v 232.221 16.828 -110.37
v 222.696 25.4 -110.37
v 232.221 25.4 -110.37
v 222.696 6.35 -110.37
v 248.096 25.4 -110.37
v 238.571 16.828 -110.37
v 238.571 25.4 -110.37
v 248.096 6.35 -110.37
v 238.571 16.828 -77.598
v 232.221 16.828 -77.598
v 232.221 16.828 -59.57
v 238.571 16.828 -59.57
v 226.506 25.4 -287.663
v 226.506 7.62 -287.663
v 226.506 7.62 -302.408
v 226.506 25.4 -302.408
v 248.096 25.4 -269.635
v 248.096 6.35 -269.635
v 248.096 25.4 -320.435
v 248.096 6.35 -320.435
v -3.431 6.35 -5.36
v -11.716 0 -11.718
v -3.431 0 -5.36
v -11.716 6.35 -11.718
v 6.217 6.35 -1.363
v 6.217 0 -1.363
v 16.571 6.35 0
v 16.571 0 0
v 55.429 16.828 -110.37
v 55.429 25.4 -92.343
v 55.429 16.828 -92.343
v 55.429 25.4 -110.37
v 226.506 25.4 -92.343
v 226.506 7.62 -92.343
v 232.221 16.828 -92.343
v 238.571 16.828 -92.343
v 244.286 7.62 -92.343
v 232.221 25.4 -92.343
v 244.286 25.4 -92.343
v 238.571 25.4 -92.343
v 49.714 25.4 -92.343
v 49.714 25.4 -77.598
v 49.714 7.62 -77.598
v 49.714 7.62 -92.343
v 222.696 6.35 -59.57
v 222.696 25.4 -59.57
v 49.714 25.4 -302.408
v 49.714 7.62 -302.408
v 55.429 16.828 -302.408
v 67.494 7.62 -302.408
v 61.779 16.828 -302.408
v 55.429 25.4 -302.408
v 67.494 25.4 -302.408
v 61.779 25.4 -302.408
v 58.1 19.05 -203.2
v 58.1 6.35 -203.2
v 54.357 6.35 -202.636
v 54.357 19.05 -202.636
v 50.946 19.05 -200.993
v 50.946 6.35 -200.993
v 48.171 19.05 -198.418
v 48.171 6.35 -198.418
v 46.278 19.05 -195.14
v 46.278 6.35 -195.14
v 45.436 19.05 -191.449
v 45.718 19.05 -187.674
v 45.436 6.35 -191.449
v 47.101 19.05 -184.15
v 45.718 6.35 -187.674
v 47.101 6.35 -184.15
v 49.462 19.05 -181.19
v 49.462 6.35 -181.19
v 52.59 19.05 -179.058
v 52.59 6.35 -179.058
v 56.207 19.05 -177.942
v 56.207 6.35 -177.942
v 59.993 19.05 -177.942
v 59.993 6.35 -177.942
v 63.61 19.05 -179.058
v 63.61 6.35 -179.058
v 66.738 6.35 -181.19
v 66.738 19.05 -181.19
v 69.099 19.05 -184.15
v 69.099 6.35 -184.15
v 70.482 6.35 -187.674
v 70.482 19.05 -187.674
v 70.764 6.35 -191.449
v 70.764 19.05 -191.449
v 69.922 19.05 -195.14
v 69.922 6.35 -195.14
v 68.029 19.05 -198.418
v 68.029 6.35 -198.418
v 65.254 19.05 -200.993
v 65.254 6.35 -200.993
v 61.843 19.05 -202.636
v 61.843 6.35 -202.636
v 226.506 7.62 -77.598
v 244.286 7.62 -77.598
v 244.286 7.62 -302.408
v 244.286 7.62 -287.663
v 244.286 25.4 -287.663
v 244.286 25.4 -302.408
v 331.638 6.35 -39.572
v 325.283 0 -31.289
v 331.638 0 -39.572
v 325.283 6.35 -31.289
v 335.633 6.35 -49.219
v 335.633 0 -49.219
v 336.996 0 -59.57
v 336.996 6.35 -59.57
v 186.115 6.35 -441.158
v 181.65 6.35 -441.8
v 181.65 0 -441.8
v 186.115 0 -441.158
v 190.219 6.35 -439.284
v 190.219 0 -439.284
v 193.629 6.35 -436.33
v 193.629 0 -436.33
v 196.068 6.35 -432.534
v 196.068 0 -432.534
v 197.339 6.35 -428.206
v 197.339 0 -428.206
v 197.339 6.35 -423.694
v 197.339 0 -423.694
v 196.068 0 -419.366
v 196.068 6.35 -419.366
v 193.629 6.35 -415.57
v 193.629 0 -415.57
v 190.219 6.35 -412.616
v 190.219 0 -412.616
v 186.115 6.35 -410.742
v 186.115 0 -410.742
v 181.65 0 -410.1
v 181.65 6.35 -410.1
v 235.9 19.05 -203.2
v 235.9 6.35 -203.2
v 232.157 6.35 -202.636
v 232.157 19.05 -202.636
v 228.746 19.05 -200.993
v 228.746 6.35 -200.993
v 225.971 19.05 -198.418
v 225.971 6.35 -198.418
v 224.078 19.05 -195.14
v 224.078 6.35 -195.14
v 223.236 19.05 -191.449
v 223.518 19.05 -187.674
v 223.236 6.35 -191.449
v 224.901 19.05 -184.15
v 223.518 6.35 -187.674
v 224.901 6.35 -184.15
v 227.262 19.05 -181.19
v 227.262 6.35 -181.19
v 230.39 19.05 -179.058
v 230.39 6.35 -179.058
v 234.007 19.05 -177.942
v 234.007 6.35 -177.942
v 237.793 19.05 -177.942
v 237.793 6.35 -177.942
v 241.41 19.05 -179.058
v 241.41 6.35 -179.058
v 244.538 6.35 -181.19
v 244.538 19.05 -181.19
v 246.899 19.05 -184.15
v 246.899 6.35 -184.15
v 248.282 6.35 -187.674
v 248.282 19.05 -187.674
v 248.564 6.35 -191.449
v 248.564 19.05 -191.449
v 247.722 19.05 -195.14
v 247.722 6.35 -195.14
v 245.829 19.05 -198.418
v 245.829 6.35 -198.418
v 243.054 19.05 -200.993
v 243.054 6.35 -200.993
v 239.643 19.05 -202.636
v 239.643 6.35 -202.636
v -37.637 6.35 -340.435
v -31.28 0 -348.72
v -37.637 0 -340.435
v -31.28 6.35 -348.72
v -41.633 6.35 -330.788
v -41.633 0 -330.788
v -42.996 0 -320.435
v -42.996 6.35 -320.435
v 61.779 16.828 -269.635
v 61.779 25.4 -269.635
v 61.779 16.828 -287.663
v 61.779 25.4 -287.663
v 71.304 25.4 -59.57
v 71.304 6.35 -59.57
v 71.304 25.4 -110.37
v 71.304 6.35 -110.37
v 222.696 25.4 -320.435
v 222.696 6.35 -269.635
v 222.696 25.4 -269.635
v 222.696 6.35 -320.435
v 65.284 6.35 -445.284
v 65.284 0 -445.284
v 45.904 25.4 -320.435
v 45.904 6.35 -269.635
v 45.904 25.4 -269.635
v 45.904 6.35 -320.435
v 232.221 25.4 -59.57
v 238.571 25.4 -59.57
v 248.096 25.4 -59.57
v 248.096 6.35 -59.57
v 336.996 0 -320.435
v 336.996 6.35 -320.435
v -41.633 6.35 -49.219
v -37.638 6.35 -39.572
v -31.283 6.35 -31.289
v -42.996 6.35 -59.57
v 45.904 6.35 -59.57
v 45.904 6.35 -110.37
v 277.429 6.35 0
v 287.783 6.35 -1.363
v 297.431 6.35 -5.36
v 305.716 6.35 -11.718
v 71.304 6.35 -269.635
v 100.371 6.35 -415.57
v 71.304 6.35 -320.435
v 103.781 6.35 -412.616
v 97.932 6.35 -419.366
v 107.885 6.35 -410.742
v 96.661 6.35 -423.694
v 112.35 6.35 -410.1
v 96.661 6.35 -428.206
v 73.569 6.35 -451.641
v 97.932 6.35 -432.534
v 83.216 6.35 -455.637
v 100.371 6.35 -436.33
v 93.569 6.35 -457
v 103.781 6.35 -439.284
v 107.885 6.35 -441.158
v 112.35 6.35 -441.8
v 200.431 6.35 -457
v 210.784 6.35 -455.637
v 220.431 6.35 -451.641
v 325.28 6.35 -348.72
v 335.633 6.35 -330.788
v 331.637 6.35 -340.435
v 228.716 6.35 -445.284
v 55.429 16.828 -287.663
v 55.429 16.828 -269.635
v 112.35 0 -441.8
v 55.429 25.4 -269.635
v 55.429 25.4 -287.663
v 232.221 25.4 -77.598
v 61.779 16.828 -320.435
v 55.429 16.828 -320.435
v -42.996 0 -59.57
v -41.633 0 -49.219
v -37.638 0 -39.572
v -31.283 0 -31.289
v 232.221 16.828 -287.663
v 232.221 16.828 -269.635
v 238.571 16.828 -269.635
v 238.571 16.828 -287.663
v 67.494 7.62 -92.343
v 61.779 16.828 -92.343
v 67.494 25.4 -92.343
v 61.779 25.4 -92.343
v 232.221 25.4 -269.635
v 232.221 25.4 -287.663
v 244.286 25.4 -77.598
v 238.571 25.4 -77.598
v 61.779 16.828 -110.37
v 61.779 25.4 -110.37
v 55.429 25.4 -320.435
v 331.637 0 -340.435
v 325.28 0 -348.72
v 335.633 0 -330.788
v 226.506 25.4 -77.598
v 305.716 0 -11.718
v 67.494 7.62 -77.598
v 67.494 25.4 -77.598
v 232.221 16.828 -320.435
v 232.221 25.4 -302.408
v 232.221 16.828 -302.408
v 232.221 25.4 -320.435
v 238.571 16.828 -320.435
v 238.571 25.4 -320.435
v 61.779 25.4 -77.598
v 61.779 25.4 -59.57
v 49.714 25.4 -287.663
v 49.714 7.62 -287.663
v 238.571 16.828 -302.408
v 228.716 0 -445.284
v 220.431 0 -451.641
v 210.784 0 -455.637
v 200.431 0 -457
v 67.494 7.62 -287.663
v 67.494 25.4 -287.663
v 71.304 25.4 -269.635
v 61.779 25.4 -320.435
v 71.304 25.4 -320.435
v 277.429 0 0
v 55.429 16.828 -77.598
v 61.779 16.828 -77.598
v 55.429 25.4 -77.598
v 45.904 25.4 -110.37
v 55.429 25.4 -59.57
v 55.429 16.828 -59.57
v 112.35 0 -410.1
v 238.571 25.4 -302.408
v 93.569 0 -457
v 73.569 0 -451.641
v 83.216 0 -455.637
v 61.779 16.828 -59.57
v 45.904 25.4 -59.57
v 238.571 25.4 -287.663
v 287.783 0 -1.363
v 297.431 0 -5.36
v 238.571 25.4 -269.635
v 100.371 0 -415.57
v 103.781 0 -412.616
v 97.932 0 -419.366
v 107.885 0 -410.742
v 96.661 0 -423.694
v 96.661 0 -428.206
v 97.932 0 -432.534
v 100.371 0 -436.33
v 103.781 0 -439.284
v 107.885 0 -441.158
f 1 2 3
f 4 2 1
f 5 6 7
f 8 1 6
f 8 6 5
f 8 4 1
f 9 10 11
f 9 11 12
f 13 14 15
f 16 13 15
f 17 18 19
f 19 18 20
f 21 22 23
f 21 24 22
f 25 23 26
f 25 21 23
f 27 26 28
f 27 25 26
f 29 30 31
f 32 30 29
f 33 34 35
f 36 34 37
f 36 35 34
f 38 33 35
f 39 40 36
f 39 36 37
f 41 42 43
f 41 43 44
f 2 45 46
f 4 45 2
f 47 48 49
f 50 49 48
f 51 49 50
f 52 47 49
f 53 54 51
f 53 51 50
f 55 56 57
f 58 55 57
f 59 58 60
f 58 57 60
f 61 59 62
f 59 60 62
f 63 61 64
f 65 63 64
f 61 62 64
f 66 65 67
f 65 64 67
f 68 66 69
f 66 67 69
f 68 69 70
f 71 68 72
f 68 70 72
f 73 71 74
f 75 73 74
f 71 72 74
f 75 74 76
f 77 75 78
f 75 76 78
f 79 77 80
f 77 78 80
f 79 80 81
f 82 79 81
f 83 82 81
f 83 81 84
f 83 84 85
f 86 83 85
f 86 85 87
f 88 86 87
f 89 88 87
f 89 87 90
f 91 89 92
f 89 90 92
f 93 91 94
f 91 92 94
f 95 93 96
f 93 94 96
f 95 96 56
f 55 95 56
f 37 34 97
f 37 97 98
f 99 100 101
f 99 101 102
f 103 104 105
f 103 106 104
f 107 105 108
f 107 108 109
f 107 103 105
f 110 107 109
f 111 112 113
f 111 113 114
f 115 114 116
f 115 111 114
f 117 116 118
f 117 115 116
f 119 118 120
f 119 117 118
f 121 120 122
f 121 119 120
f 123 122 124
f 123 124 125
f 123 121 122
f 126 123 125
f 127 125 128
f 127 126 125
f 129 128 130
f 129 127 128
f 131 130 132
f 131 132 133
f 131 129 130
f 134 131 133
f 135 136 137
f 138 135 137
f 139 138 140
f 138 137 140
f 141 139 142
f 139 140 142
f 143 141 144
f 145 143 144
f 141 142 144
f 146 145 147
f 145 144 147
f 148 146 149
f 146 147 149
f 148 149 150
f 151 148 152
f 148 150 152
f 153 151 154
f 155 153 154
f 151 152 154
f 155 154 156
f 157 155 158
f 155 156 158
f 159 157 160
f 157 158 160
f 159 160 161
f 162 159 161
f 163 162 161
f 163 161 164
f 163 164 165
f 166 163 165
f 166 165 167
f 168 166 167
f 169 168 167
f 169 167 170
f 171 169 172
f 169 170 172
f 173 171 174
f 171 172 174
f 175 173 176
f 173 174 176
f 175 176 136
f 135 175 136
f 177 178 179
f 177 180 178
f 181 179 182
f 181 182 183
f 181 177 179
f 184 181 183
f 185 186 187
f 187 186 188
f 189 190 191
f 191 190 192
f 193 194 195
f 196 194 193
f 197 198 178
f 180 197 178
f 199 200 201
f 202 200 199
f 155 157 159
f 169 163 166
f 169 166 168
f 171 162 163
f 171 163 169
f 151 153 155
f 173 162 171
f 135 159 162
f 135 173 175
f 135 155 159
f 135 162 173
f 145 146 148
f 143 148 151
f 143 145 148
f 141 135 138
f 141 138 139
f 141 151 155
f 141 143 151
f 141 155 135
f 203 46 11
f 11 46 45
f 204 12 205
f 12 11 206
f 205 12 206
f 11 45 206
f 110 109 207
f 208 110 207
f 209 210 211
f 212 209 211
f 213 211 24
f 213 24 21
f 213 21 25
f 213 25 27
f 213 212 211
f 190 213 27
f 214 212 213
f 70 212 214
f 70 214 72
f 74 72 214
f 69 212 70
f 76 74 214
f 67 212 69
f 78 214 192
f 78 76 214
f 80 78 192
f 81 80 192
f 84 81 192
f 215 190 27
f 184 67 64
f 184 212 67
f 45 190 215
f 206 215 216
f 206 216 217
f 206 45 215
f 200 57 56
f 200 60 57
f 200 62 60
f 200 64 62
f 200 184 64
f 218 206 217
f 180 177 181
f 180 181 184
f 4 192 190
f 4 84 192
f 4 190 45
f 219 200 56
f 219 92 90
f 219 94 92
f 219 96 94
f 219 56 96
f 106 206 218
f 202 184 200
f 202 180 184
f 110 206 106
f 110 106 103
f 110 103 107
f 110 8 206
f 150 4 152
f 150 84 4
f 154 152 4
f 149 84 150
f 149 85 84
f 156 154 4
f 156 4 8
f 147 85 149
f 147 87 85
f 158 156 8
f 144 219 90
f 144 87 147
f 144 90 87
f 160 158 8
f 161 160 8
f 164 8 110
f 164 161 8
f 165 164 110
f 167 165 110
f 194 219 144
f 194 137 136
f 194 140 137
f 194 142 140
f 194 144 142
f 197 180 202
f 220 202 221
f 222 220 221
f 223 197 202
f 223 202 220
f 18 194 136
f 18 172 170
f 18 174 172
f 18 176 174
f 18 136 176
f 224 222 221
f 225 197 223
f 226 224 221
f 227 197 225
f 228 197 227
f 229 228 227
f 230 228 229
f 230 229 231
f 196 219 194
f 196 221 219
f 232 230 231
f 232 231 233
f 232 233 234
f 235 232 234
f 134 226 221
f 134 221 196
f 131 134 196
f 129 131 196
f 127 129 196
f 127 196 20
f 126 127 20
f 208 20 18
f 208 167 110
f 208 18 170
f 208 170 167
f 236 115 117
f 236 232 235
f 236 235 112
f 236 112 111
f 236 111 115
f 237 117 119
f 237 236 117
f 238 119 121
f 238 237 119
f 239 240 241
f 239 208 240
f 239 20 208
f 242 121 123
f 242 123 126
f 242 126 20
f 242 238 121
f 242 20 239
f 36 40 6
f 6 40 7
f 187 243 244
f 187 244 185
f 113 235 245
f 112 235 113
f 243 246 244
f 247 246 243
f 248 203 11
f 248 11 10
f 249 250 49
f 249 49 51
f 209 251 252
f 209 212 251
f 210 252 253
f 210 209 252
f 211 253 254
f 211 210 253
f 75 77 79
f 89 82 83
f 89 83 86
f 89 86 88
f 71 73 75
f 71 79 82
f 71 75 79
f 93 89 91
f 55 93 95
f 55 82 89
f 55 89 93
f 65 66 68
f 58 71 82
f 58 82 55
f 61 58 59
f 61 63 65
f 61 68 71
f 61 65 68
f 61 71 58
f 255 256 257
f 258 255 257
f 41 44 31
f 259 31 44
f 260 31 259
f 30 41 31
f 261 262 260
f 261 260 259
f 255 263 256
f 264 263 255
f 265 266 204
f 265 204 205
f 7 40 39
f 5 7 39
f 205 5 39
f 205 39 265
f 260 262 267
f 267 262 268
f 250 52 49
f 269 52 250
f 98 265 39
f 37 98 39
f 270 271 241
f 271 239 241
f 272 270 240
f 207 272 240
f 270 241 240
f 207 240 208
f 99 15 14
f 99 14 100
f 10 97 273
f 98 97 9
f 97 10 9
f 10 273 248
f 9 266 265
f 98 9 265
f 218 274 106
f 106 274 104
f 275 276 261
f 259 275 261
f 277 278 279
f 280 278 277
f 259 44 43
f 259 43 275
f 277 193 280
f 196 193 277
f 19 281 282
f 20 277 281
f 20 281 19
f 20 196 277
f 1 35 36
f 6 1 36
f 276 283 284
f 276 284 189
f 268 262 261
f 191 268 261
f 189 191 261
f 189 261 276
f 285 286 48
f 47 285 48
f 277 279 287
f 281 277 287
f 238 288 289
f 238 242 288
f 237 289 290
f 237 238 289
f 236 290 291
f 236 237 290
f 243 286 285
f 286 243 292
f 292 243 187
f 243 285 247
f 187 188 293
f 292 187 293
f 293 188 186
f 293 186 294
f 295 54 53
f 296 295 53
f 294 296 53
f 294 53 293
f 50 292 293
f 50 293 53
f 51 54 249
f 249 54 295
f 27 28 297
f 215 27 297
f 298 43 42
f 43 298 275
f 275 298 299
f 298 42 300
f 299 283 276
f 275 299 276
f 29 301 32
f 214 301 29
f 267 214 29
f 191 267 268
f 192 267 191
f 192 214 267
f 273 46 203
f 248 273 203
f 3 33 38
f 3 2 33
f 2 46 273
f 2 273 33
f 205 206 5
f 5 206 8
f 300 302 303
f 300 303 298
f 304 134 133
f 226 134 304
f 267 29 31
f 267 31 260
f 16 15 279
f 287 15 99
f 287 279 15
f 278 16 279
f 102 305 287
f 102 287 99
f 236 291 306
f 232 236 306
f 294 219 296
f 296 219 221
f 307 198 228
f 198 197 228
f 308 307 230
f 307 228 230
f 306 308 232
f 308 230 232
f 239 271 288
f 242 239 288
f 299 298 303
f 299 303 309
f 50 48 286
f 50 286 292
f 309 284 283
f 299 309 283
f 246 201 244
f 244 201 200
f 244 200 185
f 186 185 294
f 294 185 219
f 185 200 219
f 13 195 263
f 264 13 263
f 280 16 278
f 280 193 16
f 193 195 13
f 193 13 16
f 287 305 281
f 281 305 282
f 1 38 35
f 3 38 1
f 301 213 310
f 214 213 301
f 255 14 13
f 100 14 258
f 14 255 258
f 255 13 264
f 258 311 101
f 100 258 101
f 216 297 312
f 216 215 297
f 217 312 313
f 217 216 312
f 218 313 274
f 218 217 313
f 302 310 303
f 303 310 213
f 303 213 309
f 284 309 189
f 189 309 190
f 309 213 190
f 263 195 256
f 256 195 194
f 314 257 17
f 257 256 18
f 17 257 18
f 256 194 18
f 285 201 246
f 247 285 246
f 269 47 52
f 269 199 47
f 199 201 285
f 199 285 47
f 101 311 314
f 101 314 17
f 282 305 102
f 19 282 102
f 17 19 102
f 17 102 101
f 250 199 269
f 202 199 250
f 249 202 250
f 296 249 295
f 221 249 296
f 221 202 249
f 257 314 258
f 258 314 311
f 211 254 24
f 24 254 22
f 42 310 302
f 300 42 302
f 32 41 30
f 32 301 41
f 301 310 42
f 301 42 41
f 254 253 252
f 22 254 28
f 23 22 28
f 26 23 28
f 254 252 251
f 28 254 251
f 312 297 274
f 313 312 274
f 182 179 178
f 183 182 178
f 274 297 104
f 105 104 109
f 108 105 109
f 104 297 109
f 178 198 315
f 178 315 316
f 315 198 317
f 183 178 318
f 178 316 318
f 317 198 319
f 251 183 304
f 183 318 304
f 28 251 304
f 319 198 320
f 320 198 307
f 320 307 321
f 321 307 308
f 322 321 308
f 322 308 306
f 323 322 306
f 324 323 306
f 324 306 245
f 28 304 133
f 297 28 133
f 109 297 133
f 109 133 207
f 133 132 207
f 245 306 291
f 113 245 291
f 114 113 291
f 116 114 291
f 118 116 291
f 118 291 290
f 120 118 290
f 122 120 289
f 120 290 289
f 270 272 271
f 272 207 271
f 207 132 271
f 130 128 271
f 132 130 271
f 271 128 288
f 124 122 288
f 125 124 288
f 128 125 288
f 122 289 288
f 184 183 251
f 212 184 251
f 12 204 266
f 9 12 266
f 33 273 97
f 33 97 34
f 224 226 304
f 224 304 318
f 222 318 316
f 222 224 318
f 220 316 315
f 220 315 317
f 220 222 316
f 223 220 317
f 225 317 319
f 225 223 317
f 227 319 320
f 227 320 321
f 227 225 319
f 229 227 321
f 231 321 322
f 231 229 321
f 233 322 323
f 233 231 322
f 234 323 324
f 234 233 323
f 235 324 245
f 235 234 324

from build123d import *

# Parameters (mm, degrees)
BODY_DEPTH          = 6.35
HANDLE_DEPTH        = 6.35
FILLET1_R           = 40
FILLET2_R           = 40
SKETCH3_W           = 25.4
SKETCH3_H           = 50.8
BOSS_EXTRUDE2_DEPTH = 19.05
SKETCH4_W           = 17.78
SKETCH4_H           = 14.7447
CUT_EXTRUDE1_DEPTH  = 17.78
SKETCH5_W           = 6.35
SKETCH5_H           = 18.02765
CUT_EXTRUDE2_DEPTH  = 8.5725
SKETCH6_R           = 12.7
BOSS_EXTRUDE3_DEPTH = 12.7


with BuildPart() as part:
    # Sketch1 → Body (new body)
    with BuildSketch(Plane(origin=(0, 0, 0), x_dir=(1, 0, 0), z_dir=(0, 1, 0))):
        Polygon((0, 0), (294, 0), (336.996020767, 43.003978862), (336.996020767, 337.003978862), (217, 456.999999629), (77, 456.999999629), (-42.996020767, 337.003978862), (-42.996020767, 43.003978862), align=None)
    extrude(amount=BODY_DEPTH)

    # Sketch2 → Handle (cut)
    with BuildSketch(Plane(origin=(0, 6.35, 0), x_dir=(1, 0, 0), z_dir=(0, 1, 0))):
        with BuildLine():
            Line((112.35, 441.799999629), (181.65, 441.799999629))
            ThreePointArc((181.65, 441.799999629), (197.5, 425.949999629), (181.65, 410.099999629))
            Line((181.65, 410.099999629), (112.35, 410.099999629))
            ThreePointArc((112.35, 410.099999629), (96.5, 425.949999629), (112.35, 441.799999629))
        make_face()
    extrude(amount=-HANDLE_DEPTH, mode=Mode.SUBTRACT)

    # Fillet1
    fillet1_edges = [part.edges().sort_by_distance(p)[0] for p in [
        (77, 3.175, -456.999999629),
        (217, 3.175, -456.999999629),
    ]]
    fillet(fillet1_edges, radius=FILLET1_R)

    # Fillet2
    fillet2_edges = [part.edges().sort_by_distance(p)[0] for p in [
        (-42.996020767, 3.175, -43.003978862),
        (-42.996020767, 3.175, -337.003978862),
        (336.996020767, 3.175, -337.003978862),
        (336.996020767, 3.175, -43.003978862),
        (294, 3.175, 0),
        (0, 3.175, 0),
    ]]
    fillet(fillet2_edges, radius=FILLET2_R)

    # Sketch3 → Boss-Extrude2 (add)
    with BuildSketch(Plane(origin=(0, 6.35, 0), x_dir=(1, 0, 0), z_dir=(0, 1, 0))):
        with Locations((235.396020767, 295.035436367)):
            Rectangle(SKETCH3_W, SKETCH3_H)
        with Locations((58.603979233, 295.035436367)):
            Rectangle(SKETCH3_W, SKETCH3_H)
        with Locations((235.396020767, 84.970353145)):
            Rectangle(SKETCH3_W, SKETCH3_H)
        with Locations((58.603979233, 84.970353145)):
            Rectangle(SKETCH3_W, SKETCH3_H)
    extrude(amount=BOSS_EXTRUDE2_DEPTH)

    # Sketch4 → Cut-Extrude1 (cut)
    with BuildSketch(Plane(origin=(0, 25.4, 0), x_dir=(1, 0, 0), z_dir=(0, 1, 0))):
        with Locations((58.603979233, 295.035436367)):
            Rectangle(SKETCH4_W, SKETCH4_H)
        with Locations((235.396020767, 295.035436367)):
            Rectangle(SKETCH4_W, SKETCH4_H)
        with Locations((58.603979233, 84.970353145)):
            Rectangle(SKETCH4_W, SKETCH4_H)
        with Locations((235.396020767, 84.970353145)):
            Rectangle(SKETCH4_W, SKETCH4_H)
    extrude(amount=-CUT_EXTRUDE1_DEPTH, mode=Mode.SUBTRACT)

    # Sketch5 → Cut-Extrude2 (cut)
    with BuildSketch(Plane(origin=(0, 25.4, 0), x_dir=(1, 0, 0), z_dir=(0, 1, 0))):
        with Locations((58.603979233, 101.356528145)):
            Rectangle(SKETCH5_W, SKETCH5_H)
        with Locations((58.603979233, 311.421611367)):
            Rectangle(SKETCH5_W, SKETCH5_H)
        with Locations((58.603979233, 278.649261367)):
            Rectangle(SKETCH5_W, SKETCH5_H)
        with Locations((235.396020767, 278.649261367)):
            Rectangle(SKETCH5_W, SKETCH5_H)
        with Locations((235.396020767, 311.421611367)):
            Rectangle(SKETCH5_W, SKETCH5_H)
        with Locations((58.603979233, 68.584178145)):
            Rectangle(SKETCH5_W, SKETCH5_H)
        with Locations((235.396020767, 68.584178145)):
            Rectangle(SKETCH5_W, SKETCH5_H)
        with Locations((235.396020767, 101.356528145)):
            Rectangle(SKETCH5_W, SKETCH5_H)
    extrude(amount=-CUT_EXTRUDE2_DEPTH, mode=Mode.SUBTRACT)

    # Sketch6 → Boss-Extrude3 (add)
    with BuildSketch(Plane(origin=(0, 6.35, 0), x_dir=(1, 0, 0), z_dir=(0, 1, 0))):
        with Locations(Location((58.1, 190.5, 0), (0, 0, 90))):
            Circle(SKETCH6_R)
        with Locations(Location((235.9, 190.5, 0), (0, 0, 90))):
            Circle(SKETCH6_R)
    extrude(amount=BOSS_EXTRUDE3_DEPTH)


solid = part.part
